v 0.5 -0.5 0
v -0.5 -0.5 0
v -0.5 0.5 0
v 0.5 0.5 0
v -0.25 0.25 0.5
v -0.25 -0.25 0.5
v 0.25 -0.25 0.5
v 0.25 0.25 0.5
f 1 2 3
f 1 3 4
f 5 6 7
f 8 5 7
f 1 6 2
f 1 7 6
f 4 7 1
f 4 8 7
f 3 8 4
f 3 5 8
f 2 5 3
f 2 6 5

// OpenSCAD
// Frustum (Square) for Stacks of Shapes
// by Slashee the Cow

$fn = 128;

color("MediumVioletRed")
linear_extrude(0.5, scale = 0.5)
    square(1, center = true);
